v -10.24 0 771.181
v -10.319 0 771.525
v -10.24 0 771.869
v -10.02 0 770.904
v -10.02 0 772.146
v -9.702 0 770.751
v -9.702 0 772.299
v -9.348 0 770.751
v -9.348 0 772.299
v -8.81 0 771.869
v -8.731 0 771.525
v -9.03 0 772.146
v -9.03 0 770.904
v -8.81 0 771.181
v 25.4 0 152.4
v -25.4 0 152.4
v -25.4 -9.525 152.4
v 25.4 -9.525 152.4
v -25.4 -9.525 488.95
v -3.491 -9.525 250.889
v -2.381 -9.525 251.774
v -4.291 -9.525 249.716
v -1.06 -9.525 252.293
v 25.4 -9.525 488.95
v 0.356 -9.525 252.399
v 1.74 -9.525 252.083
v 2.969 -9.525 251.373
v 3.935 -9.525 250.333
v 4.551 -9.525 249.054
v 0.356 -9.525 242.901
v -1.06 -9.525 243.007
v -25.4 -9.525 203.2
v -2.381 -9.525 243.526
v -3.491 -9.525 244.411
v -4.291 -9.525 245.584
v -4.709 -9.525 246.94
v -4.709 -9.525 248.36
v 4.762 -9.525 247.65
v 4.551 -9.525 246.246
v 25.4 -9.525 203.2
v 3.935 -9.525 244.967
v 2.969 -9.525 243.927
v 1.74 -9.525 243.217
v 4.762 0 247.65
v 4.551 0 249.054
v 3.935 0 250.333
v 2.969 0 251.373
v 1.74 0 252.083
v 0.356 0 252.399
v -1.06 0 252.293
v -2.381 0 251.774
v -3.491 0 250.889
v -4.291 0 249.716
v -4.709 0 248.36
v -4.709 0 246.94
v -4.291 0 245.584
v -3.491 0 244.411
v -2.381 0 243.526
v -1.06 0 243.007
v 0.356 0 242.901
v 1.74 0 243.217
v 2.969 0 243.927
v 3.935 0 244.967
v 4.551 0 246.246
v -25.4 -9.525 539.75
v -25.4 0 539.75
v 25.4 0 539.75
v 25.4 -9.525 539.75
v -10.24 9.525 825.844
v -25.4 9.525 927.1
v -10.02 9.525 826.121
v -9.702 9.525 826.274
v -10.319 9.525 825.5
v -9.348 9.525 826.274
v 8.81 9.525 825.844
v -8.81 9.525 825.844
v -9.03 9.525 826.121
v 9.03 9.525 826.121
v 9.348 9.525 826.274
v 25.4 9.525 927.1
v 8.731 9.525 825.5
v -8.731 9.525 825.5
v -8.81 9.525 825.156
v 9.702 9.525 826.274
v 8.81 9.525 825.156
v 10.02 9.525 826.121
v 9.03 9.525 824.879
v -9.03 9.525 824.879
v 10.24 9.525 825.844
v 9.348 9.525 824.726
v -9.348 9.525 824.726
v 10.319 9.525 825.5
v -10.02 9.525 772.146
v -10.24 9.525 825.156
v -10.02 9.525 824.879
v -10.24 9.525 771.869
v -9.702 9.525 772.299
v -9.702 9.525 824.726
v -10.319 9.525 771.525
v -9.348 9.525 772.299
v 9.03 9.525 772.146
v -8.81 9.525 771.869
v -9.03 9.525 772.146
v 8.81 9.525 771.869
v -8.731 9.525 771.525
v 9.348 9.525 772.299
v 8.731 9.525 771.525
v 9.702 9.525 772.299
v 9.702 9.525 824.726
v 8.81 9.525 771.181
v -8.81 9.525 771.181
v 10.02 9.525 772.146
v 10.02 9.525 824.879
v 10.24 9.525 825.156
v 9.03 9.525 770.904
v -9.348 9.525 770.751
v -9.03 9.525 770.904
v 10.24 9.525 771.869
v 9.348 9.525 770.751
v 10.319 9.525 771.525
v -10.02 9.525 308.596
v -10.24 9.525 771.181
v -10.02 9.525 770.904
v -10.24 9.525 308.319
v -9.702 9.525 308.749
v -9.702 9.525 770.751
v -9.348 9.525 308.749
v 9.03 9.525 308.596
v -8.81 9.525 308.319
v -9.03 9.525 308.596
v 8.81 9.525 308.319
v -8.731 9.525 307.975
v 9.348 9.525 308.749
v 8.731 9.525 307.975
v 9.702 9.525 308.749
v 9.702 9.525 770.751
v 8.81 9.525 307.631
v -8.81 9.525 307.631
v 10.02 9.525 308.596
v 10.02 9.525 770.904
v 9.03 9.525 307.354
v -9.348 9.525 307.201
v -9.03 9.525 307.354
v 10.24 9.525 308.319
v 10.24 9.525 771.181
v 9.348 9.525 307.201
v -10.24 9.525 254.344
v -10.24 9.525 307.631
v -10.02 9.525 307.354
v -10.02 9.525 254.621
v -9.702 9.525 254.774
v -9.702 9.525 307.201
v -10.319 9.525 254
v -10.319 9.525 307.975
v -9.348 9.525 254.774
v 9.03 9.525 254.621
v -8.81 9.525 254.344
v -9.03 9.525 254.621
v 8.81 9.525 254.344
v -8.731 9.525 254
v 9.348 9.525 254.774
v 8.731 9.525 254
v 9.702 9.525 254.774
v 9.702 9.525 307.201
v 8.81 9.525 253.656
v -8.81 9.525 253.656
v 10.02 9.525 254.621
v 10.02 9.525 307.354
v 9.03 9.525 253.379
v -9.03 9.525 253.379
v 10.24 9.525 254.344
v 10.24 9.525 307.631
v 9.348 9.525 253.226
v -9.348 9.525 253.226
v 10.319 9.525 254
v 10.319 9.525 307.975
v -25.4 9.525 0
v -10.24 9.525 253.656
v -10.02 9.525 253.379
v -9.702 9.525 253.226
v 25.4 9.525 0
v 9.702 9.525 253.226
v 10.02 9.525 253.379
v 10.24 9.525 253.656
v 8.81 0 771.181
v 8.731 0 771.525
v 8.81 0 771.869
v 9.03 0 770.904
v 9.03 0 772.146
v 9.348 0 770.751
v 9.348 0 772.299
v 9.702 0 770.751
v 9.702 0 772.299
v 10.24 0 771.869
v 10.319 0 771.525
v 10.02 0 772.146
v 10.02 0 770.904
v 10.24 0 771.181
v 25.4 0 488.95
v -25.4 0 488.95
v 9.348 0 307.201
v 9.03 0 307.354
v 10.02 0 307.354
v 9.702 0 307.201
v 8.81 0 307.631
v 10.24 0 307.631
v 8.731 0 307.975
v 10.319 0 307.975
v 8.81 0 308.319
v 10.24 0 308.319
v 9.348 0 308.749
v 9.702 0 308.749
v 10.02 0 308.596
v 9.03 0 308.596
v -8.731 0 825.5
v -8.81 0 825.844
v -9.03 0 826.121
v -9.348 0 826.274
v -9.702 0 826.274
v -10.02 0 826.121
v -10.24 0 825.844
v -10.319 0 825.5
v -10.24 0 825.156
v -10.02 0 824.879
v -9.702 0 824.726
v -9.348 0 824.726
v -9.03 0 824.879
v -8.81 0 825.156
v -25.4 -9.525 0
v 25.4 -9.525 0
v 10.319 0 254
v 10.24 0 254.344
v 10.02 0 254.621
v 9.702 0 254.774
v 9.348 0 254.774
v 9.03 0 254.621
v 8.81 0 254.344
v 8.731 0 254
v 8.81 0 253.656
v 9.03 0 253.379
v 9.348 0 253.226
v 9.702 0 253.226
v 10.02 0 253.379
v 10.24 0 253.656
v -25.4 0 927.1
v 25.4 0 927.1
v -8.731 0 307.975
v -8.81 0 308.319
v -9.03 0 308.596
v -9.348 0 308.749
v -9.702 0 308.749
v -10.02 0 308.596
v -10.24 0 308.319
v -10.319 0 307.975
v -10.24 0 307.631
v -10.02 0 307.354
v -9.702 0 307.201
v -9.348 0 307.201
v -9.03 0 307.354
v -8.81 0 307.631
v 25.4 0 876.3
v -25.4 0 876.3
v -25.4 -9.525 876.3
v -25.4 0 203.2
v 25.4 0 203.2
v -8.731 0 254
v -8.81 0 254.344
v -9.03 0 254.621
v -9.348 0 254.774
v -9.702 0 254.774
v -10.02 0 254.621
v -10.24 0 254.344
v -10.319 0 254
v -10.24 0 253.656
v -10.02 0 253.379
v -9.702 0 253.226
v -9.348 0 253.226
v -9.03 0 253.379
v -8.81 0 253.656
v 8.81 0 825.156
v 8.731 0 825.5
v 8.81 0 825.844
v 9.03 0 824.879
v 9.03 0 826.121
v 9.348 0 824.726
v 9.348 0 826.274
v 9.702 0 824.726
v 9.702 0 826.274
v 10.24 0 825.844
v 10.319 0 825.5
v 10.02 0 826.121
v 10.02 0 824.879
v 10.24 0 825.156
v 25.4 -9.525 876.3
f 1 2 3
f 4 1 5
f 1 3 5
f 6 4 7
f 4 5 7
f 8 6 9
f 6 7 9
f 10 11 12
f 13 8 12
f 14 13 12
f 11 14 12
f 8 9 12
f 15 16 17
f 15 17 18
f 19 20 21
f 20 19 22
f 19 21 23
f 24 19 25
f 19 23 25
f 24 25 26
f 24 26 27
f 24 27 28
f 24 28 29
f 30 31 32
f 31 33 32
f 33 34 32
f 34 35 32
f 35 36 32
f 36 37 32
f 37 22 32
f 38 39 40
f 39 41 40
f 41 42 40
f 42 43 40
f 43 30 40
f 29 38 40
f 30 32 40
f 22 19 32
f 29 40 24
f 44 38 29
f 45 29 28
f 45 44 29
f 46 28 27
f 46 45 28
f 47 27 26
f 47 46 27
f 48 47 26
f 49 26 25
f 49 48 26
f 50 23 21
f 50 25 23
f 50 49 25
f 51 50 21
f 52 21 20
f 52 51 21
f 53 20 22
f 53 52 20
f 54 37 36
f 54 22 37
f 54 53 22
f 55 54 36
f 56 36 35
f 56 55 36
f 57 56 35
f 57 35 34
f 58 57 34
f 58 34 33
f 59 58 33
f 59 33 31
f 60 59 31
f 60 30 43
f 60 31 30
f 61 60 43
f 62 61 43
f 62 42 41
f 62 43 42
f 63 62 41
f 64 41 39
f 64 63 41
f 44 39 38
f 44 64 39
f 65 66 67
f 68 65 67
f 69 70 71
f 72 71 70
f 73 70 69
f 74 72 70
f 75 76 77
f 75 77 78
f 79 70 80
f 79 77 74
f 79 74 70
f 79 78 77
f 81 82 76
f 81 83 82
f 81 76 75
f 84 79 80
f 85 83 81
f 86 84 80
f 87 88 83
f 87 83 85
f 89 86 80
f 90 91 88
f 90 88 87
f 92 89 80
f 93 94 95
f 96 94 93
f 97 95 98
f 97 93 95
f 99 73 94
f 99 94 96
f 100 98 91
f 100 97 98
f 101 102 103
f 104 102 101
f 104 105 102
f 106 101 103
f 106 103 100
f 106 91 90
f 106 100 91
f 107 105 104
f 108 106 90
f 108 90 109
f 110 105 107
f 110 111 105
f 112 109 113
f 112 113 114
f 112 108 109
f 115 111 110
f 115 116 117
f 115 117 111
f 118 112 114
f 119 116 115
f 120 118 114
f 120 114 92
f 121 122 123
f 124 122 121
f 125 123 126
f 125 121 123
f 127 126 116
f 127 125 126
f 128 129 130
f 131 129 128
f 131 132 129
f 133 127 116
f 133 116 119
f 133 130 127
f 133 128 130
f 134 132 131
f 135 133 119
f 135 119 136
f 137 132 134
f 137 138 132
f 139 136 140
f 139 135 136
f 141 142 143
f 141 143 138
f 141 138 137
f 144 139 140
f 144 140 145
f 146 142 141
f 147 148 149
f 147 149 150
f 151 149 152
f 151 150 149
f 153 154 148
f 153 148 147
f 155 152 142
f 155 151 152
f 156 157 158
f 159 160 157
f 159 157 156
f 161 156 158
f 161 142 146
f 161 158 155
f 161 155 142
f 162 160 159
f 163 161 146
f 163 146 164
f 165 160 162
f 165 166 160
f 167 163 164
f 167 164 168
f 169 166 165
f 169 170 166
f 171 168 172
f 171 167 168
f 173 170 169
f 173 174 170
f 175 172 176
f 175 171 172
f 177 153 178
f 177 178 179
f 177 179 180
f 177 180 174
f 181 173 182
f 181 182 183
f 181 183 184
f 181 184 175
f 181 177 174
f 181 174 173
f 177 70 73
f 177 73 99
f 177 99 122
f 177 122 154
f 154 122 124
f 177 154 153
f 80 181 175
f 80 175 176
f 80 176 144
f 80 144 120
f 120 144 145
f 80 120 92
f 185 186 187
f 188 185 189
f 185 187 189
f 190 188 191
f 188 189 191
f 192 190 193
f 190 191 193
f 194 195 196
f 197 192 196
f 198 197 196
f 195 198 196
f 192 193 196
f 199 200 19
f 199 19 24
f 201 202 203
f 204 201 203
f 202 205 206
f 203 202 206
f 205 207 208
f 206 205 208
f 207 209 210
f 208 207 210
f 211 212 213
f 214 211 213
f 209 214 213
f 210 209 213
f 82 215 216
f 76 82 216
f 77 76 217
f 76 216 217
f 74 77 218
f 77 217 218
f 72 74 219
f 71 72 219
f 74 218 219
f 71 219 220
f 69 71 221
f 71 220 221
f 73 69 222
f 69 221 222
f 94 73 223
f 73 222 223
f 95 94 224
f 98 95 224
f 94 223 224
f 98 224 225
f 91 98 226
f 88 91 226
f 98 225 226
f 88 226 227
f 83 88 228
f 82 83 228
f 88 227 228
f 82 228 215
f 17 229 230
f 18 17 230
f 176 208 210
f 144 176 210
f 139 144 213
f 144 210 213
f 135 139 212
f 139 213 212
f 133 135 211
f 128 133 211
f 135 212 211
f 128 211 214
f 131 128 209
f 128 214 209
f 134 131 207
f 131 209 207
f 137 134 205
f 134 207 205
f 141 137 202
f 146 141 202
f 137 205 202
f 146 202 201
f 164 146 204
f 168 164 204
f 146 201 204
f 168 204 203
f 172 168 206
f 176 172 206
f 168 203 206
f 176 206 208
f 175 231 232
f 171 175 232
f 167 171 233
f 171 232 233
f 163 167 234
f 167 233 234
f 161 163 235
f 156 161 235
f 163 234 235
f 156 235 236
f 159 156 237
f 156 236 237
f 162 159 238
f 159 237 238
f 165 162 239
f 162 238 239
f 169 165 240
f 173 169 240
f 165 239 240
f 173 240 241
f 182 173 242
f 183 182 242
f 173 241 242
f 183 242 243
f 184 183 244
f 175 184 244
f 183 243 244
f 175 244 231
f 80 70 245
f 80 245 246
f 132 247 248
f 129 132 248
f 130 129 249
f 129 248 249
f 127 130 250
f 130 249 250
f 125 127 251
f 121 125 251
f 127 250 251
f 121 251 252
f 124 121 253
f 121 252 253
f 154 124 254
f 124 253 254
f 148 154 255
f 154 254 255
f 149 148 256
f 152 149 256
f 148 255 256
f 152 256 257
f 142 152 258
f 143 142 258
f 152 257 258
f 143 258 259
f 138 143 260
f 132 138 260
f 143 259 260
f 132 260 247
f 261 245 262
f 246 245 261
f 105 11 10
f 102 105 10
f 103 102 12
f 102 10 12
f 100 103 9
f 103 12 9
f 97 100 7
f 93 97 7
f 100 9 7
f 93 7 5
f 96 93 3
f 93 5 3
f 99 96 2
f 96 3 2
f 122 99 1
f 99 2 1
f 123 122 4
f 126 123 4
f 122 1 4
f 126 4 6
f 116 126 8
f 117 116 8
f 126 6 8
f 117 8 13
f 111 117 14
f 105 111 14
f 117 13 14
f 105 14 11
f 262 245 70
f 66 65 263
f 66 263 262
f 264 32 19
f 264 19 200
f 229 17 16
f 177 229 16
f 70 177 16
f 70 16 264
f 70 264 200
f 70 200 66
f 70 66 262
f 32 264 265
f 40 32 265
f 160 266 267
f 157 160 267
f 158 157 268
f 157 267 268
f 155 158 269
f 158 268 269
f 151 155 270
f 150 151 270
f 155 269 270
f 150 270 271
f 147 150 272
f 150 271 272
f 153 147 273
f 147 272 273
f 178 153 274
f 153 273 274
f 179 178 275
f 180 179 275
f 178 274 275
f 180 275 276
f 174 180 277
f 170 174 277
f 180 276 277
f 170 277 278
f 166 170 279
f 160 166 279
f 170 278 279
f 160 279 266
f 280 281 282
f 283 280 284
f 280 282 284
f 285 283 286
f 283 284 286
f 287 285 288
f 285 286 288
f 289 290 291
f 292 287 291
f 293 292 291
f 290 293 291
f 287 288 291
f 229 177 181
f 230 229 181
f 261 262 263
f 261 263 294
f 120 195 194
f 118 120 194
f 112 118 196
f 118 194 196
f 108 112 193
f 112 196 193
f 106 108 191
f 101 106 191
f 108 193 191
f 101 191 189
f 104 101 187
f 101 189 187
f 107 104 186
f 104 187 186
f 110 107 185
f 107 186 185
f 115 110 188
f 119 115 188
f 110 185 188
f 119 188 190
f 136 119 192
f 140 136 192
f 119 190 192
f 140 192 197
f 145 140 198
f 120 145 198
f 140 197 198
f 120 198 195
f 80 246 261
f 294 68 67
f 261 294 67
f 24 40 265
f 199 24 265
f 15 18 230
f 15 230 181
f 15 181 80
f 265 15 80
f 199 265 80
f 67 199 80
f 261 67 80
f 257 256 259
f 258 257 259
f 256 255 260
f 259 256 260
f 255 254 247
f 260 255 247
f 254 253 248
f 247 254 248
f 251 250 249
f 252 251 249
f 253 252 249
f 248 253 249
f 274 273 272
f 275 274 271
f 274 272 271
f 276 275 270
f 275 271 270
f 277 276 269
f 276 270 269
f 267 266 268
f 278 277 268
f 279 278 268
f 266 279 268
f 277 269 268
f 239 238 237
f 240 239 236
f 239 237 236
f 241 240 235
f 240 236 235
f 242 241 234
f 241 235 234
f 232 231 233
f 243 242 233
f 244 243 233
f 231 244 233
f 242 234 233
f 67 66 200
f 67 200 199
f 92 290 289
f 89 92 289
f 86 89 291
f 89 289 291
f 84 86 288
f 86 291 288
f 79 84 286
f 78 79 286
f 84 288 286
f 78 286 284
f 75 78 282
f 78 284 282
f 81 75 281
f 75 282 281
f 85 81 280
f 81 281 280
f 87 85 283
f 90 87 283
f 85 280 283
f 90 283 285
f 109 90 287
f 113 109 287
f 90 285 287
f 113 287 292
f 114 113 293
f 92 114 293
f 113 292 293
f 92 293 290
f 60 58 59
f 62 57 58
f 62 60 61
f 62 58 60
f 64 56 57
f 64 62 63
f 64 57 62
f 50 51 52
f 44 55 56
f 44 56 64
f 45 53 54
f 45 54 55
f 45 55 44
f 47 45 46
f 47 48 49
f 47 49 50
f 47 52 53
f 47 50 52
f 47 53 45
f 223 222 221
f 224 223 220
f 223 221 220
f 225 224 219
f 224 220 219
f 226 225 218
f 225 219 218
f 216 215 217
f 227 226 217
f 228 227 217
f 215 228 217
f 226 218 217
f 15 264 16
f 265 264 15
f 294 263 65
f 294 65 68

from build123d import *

# Parameters (mm, degrees)
F0_W     = 50.8
F0_H     = 19.05
F1_DEPTH = 927.1
F2_W     = 122.43557321
F2_H     = 50.8
F2_W_2   = 343.1604206562
F2_W_3   = 264.5317912102
F3_DEPTH = 25.4
F4_R     = 0.79375
F5_DEPTH = 25.4
F6_R     = 4.7625
F7_DEPTH = 25.4


# Not quite as in the source:
# - a feature names something its author has since deleted; it is built from what else it names


with BuildPart() as f1:
    # F0 (on Top) → F1 (new body)
    with BuildSketch(Plane.XY):
        Rectangle(F0_W, F0_H)
    extrude(amount=F1_DEPTH)

    # F2 (on Front) → F3 (cut)
    with BuildSketch(Plane.XZ):
        with Locations((22.4465244144, 177.8)):
            Rectangle(F2_W, F2_H)
        with Locations((-38.7818217278, 901.7)):
            Rectangle(F2_W_2, F2_H)
        with Locations((-47.6498156786, 514.35)):
            Rectangle(F2_W_3, F2_H)
    extrude(amount=F3_DEPTH, mode=Mode.SUBTRACT)

    # F4 (on Front) → F5 (cut)
    with BuildSketch(Plane.XZ):
        with Locations((9.525, 254)):
            Circle(F4_R)
        with Locations((9.525, 307.975)):
            Circle(F4_R)
        with Locations((9.525, 771.525)):
            Circle(F4_R)
        with Locations((9.525, 825.5)):
            Circle(F4_R)
        with Locations((-9.525, 771.525)):
            Circle(F4_R)
        with Locations((-9.525, 825.5)):
            Circle(F4_R)
        with Locations((-9.525, 254)):
            Circle(F4_R)
        with Locations((-9.525, 307.975)):
            Circle(F4_R)
    extrude(amount=-F5_DEPTH, mode=Mode.SUBTRACT)

    # F6 (on Front) → F7 (cut)
    with BuildSketch(Plane.XZ):
        with Locations((0, 247.65)):
            Circle(F6_R)
    extrude(amount=F7_DEPTH, mode=Mode.SUBTRACT)


solid = f1.part
